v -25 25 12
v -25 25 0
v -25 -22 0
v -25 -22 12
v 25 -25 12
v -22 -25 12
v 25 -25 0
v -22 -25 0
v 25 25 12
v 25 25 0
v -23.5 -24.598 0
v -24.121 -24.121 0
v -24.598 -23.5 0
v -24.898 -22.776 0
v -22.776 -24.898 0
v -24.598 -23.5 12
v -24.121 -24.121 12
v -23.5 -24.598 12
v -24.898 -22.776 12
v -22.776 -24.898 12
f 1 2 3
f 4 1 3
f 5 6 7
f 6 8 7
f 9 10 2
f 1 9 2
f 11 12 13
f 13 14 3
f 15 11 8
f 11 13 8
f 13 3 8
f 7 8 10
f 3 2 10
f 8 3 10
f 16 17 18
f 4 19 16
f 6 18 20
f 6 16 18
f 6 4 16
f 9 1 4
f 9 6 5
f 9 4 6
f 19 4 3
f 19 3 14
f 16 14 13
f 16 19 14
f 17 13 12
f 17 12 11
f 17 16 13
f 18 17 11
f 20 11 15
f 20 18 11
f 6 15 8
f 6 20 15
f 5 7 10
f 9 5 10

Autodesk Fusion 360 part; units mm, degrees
sketch "Sketch1" plane through (0, 0, 0) normal (0, 0, 1) x (1, 0, 0)
  line L0 (-25, -25) -> (25, -25)
  line L1 (25, -25) -> (25, 25)
  line L2 (25, 25) -> (-25, 25)
  line L3 (-25, 25) -> (-25, -25)
  line L4 (-25, -25) -> (25, 25) construction
  line L5 (25, -25) -> (-25, 25) construction
  dimension "d1" = 50
  dimension "d2" = 50
extrude "Extrude1" add sketch "Sketch1" along normal blind 12
fillet "Fillet1" radius 3 1 edges at (-25, -25, 6)
equation "d1 = d2"
